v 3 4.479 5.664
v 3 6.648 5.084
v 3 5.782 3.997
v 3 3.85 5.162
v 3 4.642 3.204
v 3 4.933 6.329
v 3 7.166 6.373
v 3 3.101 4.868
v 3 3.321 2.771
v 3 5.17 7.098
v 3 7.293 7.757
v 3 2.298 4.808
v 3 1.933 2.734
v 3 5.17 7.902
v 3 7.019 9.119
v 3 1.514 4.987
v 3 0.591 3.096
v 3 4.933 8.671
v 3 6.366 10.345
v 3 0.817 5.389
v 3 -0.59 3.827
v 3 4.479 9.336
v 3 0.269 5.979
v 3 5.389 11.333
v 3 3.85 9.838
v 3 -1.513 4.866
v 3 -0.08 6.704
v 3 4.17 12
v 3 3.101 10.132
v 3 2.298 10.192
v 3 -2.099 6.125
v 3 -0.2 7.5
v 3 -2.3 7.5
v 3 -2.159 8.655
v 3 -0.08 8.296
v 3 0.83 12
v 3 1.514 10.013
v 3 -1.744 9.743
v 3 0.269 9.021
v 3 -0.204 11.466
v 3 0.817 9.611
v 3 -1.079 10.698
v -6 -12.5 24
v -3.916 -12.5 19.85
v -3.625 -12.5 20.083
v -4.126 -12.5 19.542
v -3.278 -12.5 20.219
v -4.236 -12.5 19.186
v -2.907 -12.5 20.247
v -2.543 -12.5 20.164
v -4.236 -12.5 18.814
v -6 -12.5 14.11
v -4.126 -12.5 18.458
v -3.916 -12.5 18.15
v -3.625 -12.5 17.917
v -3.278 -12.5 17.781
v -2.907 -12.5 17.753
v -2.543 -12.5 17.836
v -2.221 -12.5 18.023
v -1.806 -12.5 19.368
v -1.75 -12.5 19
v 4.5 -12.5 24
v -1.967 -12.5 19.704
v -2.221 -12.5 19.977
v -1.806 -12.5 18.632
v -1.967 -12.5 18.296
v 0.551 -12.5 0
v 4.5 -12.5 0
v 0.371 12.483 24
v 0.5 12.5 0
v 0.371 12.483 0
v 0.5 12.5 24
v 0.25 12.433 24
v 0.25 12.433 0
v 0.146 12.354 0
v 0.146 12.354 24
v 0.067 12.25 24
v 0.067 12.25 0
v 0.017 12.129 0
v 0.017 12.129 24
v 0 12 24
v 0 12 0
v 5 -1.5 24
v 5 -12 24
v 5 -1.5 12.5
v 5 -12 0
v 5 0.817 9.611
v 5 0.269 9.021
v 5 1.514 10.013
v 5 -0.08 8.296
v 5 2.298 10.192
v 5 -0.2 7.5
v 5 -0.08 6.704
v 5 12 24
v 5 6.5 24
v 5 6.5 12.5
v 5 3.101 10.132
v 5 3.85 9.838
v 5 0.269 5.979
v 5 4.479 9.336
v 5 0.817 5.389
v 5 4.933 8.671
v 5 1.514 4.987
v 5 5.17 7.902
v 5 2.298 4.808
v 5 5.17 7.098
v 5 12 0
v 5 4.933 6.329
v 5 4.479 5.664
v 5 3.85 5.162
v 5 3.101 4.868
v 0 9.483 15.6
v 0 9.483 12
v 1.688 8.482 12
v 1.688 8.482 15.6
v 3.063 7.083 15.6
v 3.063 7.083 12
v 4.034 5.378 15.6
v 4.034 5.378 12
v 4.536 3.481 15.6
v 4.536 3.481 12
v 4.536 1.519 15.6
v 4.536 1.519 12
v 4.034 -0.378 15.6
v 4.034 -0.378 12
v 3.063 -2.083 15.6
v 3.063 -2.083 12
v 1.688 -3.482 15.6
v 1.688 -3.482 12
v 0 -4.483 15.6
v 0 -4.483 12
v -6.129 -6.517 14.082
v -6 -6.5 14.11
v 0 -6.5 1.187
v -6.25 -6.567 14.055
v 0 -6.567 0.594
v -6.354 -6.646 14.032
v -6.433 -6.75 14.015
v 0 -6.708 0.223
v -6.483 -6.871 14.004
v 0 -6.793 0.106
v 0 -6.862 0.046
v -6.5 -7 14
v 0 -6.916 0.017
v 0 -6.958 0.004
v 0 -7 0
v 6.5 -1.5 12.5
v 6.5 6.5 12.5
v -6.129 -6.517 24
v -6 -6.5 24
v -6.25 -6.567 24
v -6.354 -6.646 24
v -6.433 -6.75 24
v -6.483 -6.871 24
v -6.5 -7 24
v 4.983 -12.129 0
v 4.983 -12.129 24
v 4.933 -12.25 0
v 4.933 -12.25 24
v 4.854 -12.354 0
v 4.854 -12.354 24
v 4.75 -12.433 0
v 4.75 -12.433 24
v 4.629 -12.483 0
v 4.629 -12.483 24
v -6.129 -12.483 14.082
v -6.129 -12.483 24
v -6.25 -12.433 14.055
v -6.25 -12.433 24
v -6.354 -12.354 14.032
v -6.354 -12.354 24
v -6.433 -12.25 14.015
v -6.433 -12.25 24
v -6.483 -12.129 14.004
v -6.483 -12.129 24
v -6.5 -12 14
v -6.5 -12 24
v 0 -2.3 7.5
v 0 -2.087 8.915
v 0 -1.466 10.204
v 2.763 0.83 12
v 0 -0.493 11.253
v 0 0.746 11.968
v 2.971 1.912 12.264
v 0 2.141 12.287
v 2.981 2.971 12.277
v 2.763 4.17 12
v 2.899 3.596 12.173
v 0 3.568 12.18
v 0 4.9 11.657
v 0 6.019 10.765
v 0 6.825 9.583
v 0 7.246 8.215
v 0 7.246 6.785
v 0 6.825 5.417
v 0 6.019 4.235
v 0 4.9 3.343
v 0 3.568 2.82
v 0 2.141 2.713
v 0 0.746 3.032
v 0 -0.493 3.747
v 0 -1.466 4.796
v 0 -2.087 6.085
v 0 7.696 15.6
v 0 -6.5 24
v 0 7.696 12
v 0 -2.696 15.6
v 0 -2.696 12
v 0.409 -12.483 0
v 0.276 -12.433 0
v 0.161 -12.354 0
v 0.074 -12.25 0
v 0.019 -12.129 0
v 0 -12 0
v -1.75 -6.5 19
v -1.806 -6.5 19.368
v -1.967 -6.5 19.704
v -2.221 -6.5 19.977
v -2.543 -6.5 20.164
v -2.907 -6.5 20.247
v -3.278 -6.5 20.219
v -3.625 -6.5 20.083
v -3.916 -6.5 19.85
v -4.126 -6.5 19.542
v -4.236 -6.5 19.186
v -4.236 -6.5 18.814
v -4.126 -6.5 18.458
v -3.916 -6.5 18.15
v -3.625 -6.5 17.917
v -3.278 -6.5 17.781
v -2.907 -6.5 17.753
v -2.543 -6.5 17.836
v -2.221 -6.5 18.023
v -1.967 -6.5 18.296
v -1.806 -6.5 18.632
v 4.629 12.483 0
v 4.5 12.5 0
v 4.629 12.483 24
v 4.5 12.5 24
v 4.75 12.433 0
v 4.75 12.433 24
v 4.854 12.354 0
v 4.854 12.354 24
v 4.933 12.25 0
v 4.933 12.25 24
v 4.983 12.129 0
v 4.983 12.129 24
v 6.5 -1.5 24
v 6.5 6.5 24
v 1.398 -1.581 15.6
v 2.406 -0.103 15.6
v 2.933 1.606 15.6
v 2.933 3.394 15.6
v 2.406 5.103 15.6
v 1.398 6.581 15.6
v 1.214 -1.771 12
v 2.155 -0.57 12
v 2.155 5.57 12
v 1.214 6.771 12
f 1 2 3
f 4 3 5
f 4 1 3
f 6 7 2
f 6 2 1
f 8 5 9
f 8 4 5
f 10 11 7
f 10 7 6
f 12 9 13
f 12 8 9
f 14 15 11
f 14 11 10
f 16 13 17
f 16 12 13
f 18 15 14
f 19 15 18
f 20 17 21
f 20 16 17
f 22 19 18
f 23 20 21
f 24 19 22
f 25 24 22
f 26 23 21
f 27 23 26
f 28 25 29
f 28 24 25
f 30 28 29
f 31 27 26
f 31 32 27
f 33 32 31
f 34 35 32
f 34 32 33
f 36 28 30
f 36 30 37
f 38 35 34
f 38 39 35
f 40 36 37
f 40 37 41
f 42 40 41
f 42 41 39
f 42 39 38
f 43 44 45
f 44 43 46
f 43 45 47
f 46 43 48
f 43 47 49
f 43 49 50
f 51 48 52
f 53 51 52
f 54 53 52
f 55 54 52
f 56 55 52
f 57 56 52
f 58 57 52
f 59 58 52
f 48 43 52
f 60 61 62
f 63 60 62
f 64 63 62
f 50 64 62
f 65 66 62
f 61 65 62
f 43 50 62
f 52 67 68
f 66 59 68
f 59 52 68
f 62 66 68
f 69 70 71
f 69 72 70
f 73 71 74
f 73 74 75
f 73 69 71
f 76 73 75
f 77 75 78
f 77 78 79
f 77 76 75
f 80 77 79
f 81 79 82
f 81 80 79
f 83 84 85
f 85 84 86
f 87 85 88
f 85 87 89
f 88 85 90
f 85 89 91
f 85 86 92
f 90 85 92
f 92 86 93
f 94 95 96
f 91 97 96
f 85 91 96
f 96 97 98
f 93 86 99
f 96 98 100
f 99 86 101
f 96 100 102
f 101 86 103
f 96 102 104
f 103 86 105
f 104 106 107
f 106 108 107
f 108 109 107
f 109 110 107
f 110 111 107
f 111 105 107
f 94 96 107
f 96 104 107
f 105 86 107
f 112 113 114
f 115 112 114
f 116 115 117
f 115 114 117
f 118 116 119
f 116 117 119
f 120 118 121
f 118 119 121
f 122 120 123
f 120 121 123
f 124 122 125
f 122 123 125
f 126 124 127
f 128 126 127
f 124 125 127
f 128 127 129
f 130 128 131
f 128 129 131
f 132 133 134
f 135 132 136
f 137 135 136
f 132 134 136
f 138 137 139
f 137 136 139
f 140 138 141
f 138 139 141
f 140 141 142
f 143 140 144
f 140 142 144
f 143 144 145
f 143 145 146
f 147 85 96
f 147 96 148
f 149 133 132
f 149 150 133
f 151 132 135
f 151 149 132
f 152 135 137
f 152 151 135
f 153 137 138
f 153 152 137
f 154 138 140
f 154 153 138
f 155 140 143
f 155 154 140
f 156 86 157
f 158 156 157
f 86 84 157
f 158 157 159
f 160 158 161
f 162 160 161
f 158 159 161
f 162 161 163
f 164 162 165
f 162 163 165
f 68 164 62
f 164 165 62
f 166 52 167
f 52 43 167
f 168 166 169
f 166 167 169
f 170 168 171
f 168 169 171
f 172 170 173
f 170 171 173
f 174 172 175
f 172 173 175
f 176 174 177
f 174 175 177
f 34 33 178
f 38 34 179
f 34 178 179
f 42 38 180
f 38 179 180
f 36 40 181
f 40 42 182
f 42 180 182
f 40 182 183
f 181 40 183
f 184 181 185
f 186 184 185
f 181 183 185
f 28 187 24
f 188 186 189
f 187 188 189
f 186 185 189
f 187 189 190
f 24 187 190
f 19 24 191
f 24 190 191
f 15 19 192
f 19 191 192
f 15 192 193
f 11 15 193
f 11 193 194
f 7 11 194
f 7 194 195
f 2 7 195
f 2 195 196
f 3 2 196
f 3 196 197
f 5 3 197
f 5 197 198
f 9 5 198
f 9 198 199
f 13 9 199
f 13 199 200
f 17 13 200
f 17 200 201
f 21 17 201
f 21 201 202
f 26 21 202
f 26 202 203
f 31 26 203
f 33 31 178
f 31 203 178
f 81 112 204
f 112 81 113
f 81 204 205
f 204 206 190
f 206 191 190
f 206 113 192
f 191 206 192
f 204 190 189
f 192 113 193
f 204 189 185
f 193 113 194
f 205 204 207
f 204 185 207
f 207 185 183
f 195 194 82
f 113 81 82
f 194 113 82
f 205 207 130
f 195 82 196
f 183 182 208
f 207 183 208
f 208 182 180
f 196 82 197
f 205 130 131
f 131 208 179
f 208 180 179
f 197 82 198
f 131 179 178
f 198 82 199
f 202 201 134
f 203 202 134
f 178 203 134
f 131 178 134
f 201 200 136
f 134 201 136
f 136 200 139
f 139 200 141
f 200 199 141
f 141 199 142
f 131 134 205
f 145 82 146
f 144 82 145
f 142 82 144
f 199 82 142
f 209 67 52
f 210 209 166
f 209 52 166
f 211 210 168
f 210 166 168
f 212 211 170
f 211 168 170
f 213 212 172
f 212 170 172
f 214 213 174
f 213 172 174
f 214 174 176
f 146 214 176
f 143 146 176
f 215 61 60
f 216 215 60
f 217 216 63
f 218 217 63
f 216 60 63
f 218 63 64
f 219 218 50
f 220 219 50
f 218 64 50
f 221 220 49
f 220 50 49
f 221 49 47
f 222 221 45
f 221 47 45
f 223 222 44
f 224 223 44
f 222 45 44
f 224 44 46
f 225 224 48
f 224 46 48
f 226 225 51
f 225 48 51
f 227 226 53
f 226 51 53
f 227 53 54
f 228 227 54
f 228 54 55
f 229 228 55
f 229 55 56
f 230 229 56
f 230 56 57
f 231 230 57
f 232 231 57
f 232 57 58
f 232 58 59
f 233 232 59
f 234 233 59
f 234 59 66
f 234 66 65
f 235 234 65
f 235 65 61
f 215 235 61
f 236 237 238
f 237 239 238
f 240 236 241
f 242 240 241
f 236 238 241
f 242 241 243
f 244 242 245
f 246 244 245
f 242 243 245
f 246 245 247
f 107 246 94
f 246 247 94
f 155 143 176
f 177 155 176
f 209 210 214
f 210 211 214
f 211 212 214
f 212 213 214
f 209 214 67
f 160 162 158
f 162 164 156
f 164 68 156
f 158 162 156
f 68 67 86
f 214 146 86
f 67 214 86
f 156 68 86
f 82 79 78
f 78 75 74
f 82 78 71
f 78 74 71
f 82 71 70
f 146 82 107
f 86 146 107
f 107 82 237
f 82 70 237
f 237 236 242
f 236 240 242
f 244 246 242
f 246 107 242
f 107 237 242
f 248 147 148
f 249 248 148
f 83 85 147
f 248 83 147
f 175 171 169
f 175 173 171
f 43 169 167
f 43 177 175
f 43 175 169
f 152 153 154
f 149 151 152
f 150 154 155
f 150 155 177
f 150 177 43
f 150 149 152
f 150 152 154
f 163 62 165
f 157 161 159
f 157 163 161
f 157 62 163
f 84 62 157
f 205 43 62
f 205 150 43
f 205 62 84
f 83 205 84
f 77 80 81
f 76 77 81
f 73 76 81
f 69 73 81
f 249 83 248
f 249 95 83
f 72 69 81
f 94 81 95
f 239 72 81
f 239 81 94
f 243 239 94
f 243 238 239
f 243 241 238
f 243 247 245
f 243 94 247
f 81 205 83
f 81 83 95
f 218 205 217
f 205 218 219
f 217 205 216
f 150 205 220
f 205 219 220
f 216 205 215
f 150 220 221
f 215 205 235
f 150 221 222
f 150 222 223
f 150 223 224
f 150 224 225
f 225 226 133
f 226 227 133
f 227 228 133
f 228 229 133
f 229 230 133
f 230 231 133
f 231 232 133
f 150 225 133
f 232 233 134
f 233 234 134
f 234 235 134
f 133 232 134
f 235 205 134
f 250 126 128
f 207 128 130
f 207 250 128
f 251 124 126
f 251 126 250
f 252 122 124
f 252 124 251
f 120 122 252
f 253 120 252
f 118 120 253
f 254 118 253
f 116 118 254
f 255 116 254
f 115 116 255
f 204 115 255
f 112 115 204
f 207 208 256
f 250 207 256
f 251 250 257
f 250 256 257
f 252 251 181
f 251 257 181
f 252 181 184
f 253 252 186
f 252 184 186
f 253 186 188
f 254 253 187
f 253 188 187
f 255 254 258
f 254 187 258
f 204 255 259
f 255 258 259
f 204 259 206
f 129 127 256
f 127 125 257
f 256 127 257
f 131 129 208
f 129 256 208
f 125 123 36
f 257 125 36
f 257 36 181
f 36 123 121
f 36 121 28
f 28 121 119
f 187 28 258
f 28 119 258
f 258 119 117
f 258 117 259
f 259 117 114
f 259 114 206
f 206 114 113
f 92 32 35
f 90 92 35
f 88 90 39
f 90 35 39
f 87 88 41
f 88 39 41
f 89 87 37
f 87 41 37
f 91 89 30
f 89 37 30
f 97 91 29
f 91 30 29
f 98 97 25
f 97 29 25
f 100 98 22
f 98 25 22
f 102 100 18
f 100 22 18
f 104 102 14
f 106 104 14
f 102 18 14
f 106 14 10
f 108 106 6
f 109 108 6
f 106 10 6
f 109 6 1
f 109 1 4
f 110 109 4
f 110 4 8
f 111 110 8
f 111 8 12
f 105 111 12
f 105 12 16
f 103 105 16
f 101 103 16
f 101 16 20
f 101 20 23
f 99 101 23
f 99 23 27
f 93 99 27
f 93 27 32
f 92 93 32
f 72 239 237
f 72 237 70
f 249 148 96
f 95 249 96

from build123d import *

# Parameters (mm, degrees)
BOSS_EXTRUDE1_DEPTH = 24
CUT_EXTRUDE1_REACH  = 37.26
SKETCH2_R           = 1.25
SKETCH2_W           = 1.5
SKETCH2_H           = 12.5
SKETCH3_R           = 2.7
CUT_EXTRUDE2_DEPTH  = 28.8298401
SKETCH4_R           = 4.8
CUT_EXTRUDE3_DEPTH  = 3
FILLET1_R           = 0.5
CUT_EXTRUDE4_DEPTH  = 3.6


with BuildPart() as part:
    # Sketch1 → Boss-Extrude1 (new body)
    with BuildSketch(Plane.XY):
        Polygon((5, 12.5), (0, 12.5), (0, -6.5), (-6.5, -6.5), (-6.5, -12.5), (5, -12.5), (5, -1.5), (6.5, -1.5), (6.5, 6.5), (5, 6.5), align=None)
    extrude(amount=BOSS_EXTRUDE1_DEPTH)

    # Sketch2 → Cut-Extrude1 (cut, up to next)
    with BuildSketch(Plane.XZ.offset(12.5), mode=Mode.PRIVATE) as cut_extrude1_sk1:
        with Locations((-3, 19)):
            Circle(SKETCH2_R)
    cut_extrude1_tool1 = extrude(cut_extrude1_sk1.sketch, amount=-CUT_EXTRUDE1_REACH, mode=Mode.PRIVATE) & part.part
    # Sketch2 → Cut-Extrude1 (cut, up to next)
    with BuildSketch(Plane.XZ.offset(12.5), mode=Mode.PRIVATE) as cut_extrude1_sk2:
        with Locations((5.75, 6.25)):
            Rectangle(SKETCH2_W, SKETCH2_H)
    cut_extrude1_tool2 = extrude(cut_extrude1_sk2.sketch, amount=-CUT_EXTRUDE1_REACH, mode=Mode.PRIVATE) & part.part
    # Sketch2 → Cut-Extrude1 (cut, up to next)
    with BuildSketch(Plane.XZ.offset(12.5), mode=Mode.PRIVATE) as cut_extrude1_sk3:
        Polygon((0, 0), (-6.5, 14), (-6.5, 0), align=None)
    cut_extrude1_tool3 = extrude(cut_extrude1_sk3.sketch, amount=-CUT_EXTRUDE1_REACH, mode=Mode.PRIVATE) & part.part
    add(cut_extrude1_tool1.solids().sort_by_distance((-3, -12.5, 19))[0], mode=Mode.SUBTRACT)
    add(cut_extrude1_tool2.solids().sort_by_distance((5.75, -12.5, 6.25))[0], mode=Mode.SUBTRACT)
    add(cut_extrude1_tool3.solids().sort_by_distance((-4.333333, -12.5, 4.666667))[0], mode=Mode.SUBTRACT)

    # Sketch3 → Cut-Extrude2 (cut, through all)
    with BuildSketch(Plane.ZY):
        with Locations((7.5, 2.5)):
            Circle(SKETCH3_R)
    extrude(amount=-CUT_EXTRUDE2_DEPTH, mode=Mode.SUBTRACT)

    # Sketch4 → Cut-Extrude3 (cut)
    with BuildSketch(Plane.ZY):
        with Locations((7.5, 2.5)):
            Circle(SKETCH4_R)
    extrude(amount=-CUT_EXTRUDE3_DEPTH, mode=Mode.SUBTRACT)

    # Fillet1
    fillet1_edges = [part.edges().sort_by_distance(p)[0] for p in [
        (5, -12.5, 12),
        (0, 12.5, 12),
        (5, 12.5, 12),
        (-6.5, -12.5, 19),
        (-3.25, -12.5, 7),
        (-6.5, -6.5, 19),
        (-3.25, -6.5, 7),
    ]]
    fillet(fillet1_edges, radius=FILLET1_R)

    # Sketch6 → Cut-Extrude4 (cut)
    with BuildSketch(Plane(origin=(0, 0, 12), x_dir=(-1, 0, 0), z_dir=(0, 0, -1))):
        with BuildLine():
            Line((0, 7.69614), (0, 9.48283))
            ThreePointArc((0, 9.48283), (-4.6, 2.5), (0, -4.48283))
            Line((0, -4.48283), (0, -2.69614))
            ThreePointArc((0, -2.69614), (-2.999993872, 2.5), (0, 7.69614))
        make_face()
    extrude(amount=-CUT_EXTRUDE4_DEPTH, mode=Mode.SUBTRACT)


solid = part.part
